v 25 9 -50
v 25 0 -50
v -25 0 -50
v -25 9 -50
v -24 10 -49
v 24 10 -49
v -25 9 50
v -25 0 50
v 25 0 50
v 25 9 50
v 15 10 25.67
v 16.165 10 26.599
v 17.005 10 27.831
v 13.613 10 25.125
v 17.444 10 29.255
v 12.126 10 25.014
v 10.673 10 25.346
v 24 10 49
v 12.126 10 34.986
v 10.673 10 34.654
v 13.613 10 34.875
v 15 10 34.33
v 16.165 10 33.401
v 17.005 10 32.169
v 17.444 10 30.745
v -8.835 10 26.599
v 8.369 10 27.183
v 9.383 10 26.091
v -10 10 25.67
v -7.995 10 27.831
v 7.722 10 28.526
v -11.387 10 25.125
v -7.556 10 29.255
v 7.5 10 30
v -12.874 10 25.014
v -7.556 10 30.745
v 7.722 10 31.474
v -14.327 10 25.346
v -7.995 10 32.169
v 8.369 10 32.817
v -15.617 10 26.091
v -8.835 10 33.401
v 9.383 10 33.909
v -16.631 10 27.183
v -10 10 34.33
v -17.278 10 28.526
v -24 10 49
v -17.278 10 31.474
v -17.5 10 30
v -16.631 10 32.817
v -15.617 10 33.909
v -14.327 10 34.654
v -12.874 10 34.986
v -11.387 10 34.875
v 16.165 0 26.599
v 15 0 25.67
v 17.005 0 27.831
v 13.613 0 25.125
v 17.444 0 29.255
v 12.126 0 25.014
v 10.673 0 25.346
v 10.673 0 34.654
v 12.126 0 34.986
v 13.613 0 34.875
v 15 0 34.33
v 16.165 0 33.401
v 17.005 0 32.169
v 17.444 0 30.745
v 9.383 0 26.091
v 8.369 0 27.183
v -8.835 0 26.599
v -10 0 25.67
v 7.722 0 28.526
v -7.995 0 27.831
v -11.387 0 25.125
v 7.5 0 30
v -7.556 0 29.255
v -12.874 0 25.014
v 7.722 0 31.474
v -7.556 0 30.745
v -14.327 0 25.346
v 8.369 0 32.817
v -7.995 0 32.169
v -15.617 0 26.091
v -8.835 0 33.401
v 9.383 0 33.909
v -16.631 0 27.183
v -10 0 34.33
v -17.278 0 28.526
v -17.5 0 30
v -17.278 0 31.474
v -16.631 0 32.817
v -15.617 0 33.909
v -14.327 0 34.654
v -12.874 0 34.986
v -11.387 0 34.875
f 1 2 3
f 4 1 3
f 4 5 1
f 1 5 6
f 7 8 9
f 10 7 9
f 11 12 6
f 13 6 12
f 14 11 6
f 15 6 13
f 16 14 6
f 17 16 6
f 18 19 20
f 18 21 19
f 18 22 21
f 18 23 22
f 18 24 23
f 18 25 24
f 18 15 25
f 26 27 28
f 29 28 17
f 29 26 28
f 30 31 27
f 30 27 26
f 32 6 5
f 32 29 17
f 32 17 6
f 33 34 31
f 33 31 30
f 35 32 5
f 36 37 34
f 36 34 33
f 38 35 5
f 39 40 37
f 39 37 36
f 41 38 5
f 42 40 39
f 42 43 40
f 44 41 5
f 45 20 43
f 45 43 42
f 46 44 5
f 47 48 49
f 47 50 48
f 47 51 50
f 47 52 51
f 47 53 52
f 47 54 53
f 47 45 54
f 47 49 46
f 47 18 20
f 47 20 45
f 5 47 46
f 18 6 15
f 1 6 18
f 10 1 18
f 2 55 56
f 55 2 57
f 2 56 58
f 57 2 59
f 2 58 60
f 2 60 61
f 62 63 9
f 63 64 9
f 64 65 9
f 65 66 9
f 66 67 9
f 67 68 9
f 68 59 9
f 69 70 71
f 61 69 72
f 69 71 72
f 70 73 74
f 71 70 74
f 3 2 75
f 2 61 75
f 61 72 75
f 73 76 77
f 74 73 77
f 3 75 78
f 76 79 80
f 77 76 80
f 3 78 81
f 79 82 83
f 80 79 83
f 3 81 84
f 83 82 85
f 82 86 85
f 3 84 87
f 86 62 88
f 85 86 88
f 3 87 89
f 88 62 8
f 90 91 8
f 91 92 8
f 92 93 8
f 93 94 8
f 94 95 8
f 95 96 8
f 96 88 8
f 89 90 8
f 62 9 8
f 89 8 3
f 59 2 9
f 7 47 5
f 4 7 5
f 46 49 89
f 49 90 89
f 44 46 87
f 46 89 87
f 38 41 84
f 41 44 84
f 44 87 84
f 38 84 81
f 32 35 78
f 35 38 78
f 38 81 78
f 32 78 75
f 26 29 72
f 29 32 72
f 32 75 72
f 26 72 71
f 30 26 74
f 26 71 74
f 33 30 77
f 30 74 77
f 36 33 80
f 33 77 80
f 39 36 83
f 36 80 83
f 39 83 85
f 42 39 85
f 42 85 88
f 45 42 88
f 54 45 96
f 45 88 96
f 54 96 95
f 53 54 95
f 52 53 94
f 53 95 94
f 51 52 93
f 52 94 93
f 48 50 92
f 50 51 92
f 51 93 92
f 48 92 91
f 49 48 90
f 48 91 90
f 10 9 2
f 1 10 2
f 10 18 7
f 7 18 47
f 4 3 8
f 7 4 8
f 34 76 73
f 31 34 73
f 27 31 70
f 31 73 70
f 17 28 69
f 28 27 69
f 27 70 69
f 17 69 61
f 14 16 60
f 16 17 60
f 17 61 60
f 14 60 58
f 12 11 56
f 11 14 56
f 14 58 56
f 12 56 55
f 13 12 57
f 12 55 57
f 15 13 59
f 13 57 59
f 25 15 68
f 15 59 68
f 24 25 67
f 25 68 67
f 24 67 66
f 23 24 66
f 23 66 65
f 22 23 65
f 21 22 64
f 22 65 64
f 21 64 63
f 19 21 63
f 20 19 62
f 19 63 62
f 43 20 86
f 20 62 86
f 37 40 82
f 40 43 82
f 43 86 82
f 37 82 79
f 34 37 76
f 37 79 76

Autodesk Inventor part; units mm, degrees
ref_plane "YZ Plane" through (0, 0, 0) normal (1, 0, 0) x (0, 1, 0)
ref_plane "XZ Plane" through (0, 0, 0) normal (0, 1, 0) x (-1, 0, 0)
ref_plane "XY Plane" through (0, 0, 0) normal (0, 0, 1) x (1, 0, 0)
sketch "草圖1" plane through (0, 0, 0) normal (0, 1, 0) x (-1, 0, 0)
  line L0 (25, 50) -> (-25, 50)
  line L1 (-25, 50) -> (-25, -50)
  line L2 (-25, -50) -> (25, -50)
  line L3 (25, -50) -> (25, 50)
  circle A0 centre (12.5, 30) radius 5
  circle A1 centre (-12.5, 30) radius 5
  point P0 (0, 0)
  point P1 (25, 0)
  point P2 (0, -50)
  dimension "d0" = 50
  dimension "d1" = 100
  dimension "d2" = 25
  dimension "d3" = 12.5
  dimension "d4" = 10
  dimension "d5" = 20
extrude "擠出1" add sketch "草圖1" along normal blind 10
chamfer "倒角1" distance 1 angle 45 4 edges at (0, 10, 50) (-25, 10, 0) (25, 10, 0) (0, 10, -50)
thread "螺紋1" size "M10x1.25" class "6H" standard "ISO Metric profile" full length
thread "螺紋2" size "M10x1.5" class "6H" standard "ANSI Metric M Profile" full length
properties part number "P10"
